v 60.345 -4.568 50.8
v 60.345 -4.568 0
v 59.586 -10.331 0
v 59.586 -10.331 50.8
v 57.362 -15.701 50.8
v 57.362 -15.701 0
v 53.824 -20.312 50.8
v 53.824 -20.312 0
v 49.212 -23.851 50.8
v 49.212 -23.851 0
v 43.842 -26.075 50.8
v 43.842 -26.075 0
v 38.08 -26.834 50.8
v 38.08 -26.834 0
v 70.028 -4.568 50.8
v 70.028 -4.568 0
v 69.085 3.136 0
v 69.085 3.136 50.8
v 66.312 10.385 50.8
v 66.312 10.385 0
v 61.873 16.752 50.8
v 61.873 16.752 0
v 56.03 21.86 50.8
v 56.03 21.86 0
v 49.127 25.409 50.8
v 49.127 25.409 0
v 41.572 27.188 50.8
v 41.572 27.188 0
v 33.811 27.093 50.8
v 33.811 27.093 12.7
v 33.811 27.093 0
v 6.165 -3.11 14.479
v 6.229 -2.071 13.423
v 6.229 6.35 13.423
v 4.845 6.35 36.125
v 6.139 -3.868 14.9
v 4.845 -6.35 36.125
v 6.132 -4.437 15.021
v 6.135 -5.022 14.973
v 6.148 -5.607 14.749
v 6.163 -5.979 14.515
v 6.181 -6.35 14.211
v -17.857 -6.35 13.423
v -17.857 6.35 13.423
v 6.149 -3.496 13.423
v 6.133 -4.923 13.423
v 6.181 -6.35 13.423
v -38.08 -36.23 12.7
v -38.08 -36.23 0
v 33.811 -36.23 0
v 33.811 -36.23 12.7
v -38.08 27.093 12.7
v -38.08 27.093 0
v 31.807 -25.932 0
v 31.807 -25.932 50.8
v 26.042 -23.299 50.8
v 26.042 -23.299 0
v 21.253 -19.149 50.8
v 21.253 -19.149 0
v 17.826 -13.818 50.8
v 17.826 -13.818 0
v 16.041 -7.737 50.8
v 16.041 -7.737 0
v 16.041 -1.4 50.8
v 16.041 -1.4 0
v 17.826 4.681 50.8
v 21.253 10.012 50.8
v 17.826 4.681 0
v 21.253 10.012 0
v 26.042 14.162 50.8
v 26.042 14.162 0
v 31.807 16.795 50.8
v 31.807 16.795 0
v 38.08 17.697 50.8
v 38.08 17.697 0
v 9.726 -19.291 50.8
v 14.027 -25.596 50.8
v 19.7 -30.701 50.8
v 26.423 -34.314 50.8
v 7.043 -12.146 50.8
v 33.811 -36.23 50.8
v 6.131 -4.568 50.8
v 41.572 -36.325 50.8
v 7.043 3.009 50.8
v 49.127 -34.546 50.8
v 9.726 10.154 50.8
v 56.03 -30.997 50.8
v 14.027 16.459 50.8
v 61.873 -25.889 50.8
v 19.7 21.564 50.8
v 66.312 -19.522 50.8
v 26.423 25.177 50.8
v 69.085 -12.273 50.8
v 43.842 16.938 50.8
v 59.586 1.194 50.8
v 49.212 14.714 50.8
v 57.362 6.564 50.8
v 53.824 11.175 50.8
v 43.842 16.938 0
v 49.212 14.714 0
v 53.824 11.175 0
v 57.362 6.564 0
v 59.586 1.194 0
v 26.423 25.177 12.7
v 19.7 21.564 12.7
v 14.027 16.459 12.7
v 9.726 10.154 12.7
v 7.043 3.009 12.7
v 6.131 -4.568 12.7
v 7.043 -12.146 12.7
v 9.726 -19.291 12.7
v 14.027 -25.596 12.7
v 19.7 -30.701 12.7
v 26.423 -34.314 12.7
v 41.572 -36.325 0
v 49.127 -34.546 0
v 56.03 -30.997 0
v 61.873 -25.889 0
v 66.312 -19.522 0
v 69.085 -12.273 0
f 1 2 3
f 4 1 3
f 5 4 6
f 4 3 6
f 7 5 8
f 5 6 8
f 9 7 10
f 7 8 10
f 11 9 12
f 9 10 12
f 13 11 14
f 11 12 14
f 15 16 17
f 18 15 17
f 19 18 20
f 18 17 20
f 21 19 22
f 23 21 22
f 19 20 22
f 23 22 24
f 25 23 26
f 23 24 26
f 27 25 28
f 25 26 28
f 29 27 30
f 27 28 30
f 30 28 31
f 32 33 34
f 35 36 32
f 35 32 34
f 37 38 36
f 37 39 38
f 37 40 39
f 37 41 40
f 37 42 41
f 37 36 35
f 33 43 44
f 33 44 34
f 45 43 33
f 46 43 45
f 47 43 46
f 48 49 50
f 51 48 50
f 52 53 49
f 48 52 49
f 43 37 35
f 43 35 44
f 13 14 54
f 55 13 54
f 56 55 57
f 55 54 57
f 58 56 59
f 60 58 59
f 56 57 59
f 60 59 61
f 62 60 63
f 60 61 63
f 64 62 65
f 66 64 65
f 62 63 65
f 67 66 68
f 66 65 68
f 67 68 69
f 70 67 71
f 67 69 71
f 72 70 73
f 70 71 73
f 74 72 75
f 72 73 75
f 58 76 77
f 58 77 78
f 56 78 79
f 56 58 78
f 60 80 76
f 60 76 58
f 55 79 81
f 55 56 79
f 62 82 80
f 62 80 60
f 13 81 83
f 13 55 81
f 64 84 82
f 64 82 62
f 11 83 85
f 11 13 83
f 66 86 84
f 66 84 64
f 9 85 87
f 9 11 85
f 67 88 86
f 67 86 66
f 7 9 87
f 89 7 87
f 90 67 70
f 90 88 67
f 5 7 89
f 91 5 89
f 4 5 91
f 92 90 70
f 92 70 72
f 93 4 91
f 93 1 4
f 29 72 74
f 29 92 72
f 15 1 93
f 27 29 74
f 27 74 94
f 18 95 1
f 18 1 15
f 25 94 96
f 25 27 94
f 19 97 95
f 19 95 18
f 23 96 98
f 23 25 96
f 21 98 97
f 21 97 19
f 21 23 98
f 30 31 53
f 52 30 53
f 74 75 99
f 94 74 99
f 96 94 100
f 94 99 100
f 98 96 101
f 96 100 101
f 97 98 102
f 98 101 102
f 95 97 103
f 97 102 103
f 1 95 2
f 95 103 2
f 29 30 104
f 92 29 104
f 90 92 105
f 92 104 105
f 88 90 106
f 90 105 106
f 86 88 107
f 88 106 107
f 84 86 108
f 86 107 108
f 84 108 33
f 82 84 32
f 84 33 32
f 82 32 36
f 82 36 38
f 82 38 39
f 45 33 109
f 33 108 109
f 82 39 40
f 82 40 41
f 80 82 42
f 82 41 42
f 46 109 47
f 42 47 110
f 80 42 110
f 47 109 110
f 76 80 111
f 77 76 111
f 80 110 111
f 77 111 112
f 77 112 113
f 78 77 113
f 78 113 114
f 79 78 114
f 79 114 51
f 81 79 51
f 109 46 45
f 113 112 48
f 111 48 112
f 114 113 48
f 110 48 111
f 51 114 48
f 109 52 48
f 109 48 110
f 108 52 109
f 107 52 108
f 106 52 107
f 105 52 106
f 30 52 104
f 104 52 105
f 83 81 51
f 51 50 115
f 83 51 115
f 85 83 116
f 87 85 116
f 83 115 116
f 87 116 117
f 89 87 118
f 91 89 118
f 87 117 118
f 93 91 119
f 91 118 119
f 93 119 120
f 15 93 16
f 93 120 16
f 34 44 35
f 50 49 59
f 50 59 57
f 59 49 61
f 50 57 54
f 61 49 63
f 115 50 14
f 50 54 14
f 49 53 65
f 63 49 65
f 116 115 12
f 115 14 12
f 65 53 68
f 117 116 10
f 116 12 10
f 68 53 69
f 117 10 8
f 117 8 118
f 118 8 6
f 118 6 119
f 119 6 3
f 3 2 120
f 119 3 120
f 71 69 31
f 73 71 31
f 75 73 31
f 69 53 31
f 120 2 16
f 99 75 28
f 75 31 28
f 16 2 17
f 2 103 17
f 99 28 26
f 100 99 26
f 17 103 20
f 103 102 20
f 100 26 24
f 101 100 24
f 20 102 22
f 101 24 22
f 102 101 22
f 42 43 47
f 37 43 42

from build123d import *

# Parameters (mm, degrees)
F1_DEPTH = 50.8
F2_DEPTH = 12.7
F4_DEPTH = 6.35


with BuildPart() as f1:
    # F0 (on Top) → F1 (new body)
    with BuildSketch(Plane.XY):
        with BuildLine():
            Line((33.810558, 27.093243), (38.079627, 27.093243))
            Line((38.079627, 27.093243), (38.079627, 17.69675))
            ThreePointArc((38.079627, 17.69675), (53.823516, 11.175418), (60.344848, -4.568471))
            ThreePointArc((60.344848, -4.568471), (53.823516, -20.312359), (38.079627, -26.833692))
            Line((38.079627, -26.833692), (38.079627, -36.230184))
            Line((38.079627, -36.230184), (33.810558, -36.230184))
            ThreePointArc((33.810558, -36.230184), (59.106989, -28.62131), (70.027851, -4.568471))
            ThreePointArc((70.027851, -4.568471), (59.106989, 19.484369), (33.810558, 27.093243))
        make_face()
        with BuildLine():
            Line((38.079627, 17.69675), (38.079627, 27.093243))
            Line((38.079627, 27.093243), (33.810558, 27.093243))
            ThreePointArc((33.810558, 27.093243), (6.131402, -4.568471), (33.810558, -36.230184))
            Line((33.810558, -36.230184), (38.079627, -36.230184))
            Line((38.079627, -36.230184), (38.079627, -26.833692))
            ThreePointArc((38.079627, -26.833692), (15.814406, -4.568471), (38.079627, 17.69675))
        make_face()
    extrude(amount=F1_DEPTH)

    # F0 (on Top) → F2 (join)
    with BuildSketch(Plane.XY):
        with BuildLine():
            Line((33.810558, 27.093243), (38.079627, 27.093243))
            Line((38.079627, 27.093243), (38.079627, 17.69675))
            ThreePointArc((38.079627, 17.69675), (53.823516, 11.175418), (60.344848, -4.568471))
            ThreePointArc((60.344848, -4.568471), (53.823516, -20.312359), (38.079627, -26.833692))
            Line((38.079627, -26.833692), (38.079627, -36.230184))
            Line((38.079627, -36.230184), (33.810558, -36.230184))
            ThreePointArc((33.810558, -36.230184), (59.106989, -28.62131), (70.027851, -4.568471))
            ThreePointArc((70.027851, -4.568471), (59.106989, 19.484369), (33.810558, 27.093243))
        make_face()
        with BuildLine():
            ThreePointArc((33.810558, -36.230184), (6.131402, -4.568471), (33.810558, 27.093243))
            Line((33.810558, 27.093243), (-38.079627, 27.093243))
            Line((-38.079627, 27.093243), (-38.079627, -36.230184))
            Line((-38.079627, -36.230184), (33.810558, -36.230184))
        make_face()
    extrude(amount=F2_DEPTH)

    # F3 (on Front) → F4 (join, symmetric)
    with BuildSketch(Plane.XZ):
        Polygon((6.229152, 13.422799), (4.844896, 36.124598), (-17.856903, 13.422799), align=None)
    extrude(amount=F4_DEPTH, both=True)


solid = f1.part
